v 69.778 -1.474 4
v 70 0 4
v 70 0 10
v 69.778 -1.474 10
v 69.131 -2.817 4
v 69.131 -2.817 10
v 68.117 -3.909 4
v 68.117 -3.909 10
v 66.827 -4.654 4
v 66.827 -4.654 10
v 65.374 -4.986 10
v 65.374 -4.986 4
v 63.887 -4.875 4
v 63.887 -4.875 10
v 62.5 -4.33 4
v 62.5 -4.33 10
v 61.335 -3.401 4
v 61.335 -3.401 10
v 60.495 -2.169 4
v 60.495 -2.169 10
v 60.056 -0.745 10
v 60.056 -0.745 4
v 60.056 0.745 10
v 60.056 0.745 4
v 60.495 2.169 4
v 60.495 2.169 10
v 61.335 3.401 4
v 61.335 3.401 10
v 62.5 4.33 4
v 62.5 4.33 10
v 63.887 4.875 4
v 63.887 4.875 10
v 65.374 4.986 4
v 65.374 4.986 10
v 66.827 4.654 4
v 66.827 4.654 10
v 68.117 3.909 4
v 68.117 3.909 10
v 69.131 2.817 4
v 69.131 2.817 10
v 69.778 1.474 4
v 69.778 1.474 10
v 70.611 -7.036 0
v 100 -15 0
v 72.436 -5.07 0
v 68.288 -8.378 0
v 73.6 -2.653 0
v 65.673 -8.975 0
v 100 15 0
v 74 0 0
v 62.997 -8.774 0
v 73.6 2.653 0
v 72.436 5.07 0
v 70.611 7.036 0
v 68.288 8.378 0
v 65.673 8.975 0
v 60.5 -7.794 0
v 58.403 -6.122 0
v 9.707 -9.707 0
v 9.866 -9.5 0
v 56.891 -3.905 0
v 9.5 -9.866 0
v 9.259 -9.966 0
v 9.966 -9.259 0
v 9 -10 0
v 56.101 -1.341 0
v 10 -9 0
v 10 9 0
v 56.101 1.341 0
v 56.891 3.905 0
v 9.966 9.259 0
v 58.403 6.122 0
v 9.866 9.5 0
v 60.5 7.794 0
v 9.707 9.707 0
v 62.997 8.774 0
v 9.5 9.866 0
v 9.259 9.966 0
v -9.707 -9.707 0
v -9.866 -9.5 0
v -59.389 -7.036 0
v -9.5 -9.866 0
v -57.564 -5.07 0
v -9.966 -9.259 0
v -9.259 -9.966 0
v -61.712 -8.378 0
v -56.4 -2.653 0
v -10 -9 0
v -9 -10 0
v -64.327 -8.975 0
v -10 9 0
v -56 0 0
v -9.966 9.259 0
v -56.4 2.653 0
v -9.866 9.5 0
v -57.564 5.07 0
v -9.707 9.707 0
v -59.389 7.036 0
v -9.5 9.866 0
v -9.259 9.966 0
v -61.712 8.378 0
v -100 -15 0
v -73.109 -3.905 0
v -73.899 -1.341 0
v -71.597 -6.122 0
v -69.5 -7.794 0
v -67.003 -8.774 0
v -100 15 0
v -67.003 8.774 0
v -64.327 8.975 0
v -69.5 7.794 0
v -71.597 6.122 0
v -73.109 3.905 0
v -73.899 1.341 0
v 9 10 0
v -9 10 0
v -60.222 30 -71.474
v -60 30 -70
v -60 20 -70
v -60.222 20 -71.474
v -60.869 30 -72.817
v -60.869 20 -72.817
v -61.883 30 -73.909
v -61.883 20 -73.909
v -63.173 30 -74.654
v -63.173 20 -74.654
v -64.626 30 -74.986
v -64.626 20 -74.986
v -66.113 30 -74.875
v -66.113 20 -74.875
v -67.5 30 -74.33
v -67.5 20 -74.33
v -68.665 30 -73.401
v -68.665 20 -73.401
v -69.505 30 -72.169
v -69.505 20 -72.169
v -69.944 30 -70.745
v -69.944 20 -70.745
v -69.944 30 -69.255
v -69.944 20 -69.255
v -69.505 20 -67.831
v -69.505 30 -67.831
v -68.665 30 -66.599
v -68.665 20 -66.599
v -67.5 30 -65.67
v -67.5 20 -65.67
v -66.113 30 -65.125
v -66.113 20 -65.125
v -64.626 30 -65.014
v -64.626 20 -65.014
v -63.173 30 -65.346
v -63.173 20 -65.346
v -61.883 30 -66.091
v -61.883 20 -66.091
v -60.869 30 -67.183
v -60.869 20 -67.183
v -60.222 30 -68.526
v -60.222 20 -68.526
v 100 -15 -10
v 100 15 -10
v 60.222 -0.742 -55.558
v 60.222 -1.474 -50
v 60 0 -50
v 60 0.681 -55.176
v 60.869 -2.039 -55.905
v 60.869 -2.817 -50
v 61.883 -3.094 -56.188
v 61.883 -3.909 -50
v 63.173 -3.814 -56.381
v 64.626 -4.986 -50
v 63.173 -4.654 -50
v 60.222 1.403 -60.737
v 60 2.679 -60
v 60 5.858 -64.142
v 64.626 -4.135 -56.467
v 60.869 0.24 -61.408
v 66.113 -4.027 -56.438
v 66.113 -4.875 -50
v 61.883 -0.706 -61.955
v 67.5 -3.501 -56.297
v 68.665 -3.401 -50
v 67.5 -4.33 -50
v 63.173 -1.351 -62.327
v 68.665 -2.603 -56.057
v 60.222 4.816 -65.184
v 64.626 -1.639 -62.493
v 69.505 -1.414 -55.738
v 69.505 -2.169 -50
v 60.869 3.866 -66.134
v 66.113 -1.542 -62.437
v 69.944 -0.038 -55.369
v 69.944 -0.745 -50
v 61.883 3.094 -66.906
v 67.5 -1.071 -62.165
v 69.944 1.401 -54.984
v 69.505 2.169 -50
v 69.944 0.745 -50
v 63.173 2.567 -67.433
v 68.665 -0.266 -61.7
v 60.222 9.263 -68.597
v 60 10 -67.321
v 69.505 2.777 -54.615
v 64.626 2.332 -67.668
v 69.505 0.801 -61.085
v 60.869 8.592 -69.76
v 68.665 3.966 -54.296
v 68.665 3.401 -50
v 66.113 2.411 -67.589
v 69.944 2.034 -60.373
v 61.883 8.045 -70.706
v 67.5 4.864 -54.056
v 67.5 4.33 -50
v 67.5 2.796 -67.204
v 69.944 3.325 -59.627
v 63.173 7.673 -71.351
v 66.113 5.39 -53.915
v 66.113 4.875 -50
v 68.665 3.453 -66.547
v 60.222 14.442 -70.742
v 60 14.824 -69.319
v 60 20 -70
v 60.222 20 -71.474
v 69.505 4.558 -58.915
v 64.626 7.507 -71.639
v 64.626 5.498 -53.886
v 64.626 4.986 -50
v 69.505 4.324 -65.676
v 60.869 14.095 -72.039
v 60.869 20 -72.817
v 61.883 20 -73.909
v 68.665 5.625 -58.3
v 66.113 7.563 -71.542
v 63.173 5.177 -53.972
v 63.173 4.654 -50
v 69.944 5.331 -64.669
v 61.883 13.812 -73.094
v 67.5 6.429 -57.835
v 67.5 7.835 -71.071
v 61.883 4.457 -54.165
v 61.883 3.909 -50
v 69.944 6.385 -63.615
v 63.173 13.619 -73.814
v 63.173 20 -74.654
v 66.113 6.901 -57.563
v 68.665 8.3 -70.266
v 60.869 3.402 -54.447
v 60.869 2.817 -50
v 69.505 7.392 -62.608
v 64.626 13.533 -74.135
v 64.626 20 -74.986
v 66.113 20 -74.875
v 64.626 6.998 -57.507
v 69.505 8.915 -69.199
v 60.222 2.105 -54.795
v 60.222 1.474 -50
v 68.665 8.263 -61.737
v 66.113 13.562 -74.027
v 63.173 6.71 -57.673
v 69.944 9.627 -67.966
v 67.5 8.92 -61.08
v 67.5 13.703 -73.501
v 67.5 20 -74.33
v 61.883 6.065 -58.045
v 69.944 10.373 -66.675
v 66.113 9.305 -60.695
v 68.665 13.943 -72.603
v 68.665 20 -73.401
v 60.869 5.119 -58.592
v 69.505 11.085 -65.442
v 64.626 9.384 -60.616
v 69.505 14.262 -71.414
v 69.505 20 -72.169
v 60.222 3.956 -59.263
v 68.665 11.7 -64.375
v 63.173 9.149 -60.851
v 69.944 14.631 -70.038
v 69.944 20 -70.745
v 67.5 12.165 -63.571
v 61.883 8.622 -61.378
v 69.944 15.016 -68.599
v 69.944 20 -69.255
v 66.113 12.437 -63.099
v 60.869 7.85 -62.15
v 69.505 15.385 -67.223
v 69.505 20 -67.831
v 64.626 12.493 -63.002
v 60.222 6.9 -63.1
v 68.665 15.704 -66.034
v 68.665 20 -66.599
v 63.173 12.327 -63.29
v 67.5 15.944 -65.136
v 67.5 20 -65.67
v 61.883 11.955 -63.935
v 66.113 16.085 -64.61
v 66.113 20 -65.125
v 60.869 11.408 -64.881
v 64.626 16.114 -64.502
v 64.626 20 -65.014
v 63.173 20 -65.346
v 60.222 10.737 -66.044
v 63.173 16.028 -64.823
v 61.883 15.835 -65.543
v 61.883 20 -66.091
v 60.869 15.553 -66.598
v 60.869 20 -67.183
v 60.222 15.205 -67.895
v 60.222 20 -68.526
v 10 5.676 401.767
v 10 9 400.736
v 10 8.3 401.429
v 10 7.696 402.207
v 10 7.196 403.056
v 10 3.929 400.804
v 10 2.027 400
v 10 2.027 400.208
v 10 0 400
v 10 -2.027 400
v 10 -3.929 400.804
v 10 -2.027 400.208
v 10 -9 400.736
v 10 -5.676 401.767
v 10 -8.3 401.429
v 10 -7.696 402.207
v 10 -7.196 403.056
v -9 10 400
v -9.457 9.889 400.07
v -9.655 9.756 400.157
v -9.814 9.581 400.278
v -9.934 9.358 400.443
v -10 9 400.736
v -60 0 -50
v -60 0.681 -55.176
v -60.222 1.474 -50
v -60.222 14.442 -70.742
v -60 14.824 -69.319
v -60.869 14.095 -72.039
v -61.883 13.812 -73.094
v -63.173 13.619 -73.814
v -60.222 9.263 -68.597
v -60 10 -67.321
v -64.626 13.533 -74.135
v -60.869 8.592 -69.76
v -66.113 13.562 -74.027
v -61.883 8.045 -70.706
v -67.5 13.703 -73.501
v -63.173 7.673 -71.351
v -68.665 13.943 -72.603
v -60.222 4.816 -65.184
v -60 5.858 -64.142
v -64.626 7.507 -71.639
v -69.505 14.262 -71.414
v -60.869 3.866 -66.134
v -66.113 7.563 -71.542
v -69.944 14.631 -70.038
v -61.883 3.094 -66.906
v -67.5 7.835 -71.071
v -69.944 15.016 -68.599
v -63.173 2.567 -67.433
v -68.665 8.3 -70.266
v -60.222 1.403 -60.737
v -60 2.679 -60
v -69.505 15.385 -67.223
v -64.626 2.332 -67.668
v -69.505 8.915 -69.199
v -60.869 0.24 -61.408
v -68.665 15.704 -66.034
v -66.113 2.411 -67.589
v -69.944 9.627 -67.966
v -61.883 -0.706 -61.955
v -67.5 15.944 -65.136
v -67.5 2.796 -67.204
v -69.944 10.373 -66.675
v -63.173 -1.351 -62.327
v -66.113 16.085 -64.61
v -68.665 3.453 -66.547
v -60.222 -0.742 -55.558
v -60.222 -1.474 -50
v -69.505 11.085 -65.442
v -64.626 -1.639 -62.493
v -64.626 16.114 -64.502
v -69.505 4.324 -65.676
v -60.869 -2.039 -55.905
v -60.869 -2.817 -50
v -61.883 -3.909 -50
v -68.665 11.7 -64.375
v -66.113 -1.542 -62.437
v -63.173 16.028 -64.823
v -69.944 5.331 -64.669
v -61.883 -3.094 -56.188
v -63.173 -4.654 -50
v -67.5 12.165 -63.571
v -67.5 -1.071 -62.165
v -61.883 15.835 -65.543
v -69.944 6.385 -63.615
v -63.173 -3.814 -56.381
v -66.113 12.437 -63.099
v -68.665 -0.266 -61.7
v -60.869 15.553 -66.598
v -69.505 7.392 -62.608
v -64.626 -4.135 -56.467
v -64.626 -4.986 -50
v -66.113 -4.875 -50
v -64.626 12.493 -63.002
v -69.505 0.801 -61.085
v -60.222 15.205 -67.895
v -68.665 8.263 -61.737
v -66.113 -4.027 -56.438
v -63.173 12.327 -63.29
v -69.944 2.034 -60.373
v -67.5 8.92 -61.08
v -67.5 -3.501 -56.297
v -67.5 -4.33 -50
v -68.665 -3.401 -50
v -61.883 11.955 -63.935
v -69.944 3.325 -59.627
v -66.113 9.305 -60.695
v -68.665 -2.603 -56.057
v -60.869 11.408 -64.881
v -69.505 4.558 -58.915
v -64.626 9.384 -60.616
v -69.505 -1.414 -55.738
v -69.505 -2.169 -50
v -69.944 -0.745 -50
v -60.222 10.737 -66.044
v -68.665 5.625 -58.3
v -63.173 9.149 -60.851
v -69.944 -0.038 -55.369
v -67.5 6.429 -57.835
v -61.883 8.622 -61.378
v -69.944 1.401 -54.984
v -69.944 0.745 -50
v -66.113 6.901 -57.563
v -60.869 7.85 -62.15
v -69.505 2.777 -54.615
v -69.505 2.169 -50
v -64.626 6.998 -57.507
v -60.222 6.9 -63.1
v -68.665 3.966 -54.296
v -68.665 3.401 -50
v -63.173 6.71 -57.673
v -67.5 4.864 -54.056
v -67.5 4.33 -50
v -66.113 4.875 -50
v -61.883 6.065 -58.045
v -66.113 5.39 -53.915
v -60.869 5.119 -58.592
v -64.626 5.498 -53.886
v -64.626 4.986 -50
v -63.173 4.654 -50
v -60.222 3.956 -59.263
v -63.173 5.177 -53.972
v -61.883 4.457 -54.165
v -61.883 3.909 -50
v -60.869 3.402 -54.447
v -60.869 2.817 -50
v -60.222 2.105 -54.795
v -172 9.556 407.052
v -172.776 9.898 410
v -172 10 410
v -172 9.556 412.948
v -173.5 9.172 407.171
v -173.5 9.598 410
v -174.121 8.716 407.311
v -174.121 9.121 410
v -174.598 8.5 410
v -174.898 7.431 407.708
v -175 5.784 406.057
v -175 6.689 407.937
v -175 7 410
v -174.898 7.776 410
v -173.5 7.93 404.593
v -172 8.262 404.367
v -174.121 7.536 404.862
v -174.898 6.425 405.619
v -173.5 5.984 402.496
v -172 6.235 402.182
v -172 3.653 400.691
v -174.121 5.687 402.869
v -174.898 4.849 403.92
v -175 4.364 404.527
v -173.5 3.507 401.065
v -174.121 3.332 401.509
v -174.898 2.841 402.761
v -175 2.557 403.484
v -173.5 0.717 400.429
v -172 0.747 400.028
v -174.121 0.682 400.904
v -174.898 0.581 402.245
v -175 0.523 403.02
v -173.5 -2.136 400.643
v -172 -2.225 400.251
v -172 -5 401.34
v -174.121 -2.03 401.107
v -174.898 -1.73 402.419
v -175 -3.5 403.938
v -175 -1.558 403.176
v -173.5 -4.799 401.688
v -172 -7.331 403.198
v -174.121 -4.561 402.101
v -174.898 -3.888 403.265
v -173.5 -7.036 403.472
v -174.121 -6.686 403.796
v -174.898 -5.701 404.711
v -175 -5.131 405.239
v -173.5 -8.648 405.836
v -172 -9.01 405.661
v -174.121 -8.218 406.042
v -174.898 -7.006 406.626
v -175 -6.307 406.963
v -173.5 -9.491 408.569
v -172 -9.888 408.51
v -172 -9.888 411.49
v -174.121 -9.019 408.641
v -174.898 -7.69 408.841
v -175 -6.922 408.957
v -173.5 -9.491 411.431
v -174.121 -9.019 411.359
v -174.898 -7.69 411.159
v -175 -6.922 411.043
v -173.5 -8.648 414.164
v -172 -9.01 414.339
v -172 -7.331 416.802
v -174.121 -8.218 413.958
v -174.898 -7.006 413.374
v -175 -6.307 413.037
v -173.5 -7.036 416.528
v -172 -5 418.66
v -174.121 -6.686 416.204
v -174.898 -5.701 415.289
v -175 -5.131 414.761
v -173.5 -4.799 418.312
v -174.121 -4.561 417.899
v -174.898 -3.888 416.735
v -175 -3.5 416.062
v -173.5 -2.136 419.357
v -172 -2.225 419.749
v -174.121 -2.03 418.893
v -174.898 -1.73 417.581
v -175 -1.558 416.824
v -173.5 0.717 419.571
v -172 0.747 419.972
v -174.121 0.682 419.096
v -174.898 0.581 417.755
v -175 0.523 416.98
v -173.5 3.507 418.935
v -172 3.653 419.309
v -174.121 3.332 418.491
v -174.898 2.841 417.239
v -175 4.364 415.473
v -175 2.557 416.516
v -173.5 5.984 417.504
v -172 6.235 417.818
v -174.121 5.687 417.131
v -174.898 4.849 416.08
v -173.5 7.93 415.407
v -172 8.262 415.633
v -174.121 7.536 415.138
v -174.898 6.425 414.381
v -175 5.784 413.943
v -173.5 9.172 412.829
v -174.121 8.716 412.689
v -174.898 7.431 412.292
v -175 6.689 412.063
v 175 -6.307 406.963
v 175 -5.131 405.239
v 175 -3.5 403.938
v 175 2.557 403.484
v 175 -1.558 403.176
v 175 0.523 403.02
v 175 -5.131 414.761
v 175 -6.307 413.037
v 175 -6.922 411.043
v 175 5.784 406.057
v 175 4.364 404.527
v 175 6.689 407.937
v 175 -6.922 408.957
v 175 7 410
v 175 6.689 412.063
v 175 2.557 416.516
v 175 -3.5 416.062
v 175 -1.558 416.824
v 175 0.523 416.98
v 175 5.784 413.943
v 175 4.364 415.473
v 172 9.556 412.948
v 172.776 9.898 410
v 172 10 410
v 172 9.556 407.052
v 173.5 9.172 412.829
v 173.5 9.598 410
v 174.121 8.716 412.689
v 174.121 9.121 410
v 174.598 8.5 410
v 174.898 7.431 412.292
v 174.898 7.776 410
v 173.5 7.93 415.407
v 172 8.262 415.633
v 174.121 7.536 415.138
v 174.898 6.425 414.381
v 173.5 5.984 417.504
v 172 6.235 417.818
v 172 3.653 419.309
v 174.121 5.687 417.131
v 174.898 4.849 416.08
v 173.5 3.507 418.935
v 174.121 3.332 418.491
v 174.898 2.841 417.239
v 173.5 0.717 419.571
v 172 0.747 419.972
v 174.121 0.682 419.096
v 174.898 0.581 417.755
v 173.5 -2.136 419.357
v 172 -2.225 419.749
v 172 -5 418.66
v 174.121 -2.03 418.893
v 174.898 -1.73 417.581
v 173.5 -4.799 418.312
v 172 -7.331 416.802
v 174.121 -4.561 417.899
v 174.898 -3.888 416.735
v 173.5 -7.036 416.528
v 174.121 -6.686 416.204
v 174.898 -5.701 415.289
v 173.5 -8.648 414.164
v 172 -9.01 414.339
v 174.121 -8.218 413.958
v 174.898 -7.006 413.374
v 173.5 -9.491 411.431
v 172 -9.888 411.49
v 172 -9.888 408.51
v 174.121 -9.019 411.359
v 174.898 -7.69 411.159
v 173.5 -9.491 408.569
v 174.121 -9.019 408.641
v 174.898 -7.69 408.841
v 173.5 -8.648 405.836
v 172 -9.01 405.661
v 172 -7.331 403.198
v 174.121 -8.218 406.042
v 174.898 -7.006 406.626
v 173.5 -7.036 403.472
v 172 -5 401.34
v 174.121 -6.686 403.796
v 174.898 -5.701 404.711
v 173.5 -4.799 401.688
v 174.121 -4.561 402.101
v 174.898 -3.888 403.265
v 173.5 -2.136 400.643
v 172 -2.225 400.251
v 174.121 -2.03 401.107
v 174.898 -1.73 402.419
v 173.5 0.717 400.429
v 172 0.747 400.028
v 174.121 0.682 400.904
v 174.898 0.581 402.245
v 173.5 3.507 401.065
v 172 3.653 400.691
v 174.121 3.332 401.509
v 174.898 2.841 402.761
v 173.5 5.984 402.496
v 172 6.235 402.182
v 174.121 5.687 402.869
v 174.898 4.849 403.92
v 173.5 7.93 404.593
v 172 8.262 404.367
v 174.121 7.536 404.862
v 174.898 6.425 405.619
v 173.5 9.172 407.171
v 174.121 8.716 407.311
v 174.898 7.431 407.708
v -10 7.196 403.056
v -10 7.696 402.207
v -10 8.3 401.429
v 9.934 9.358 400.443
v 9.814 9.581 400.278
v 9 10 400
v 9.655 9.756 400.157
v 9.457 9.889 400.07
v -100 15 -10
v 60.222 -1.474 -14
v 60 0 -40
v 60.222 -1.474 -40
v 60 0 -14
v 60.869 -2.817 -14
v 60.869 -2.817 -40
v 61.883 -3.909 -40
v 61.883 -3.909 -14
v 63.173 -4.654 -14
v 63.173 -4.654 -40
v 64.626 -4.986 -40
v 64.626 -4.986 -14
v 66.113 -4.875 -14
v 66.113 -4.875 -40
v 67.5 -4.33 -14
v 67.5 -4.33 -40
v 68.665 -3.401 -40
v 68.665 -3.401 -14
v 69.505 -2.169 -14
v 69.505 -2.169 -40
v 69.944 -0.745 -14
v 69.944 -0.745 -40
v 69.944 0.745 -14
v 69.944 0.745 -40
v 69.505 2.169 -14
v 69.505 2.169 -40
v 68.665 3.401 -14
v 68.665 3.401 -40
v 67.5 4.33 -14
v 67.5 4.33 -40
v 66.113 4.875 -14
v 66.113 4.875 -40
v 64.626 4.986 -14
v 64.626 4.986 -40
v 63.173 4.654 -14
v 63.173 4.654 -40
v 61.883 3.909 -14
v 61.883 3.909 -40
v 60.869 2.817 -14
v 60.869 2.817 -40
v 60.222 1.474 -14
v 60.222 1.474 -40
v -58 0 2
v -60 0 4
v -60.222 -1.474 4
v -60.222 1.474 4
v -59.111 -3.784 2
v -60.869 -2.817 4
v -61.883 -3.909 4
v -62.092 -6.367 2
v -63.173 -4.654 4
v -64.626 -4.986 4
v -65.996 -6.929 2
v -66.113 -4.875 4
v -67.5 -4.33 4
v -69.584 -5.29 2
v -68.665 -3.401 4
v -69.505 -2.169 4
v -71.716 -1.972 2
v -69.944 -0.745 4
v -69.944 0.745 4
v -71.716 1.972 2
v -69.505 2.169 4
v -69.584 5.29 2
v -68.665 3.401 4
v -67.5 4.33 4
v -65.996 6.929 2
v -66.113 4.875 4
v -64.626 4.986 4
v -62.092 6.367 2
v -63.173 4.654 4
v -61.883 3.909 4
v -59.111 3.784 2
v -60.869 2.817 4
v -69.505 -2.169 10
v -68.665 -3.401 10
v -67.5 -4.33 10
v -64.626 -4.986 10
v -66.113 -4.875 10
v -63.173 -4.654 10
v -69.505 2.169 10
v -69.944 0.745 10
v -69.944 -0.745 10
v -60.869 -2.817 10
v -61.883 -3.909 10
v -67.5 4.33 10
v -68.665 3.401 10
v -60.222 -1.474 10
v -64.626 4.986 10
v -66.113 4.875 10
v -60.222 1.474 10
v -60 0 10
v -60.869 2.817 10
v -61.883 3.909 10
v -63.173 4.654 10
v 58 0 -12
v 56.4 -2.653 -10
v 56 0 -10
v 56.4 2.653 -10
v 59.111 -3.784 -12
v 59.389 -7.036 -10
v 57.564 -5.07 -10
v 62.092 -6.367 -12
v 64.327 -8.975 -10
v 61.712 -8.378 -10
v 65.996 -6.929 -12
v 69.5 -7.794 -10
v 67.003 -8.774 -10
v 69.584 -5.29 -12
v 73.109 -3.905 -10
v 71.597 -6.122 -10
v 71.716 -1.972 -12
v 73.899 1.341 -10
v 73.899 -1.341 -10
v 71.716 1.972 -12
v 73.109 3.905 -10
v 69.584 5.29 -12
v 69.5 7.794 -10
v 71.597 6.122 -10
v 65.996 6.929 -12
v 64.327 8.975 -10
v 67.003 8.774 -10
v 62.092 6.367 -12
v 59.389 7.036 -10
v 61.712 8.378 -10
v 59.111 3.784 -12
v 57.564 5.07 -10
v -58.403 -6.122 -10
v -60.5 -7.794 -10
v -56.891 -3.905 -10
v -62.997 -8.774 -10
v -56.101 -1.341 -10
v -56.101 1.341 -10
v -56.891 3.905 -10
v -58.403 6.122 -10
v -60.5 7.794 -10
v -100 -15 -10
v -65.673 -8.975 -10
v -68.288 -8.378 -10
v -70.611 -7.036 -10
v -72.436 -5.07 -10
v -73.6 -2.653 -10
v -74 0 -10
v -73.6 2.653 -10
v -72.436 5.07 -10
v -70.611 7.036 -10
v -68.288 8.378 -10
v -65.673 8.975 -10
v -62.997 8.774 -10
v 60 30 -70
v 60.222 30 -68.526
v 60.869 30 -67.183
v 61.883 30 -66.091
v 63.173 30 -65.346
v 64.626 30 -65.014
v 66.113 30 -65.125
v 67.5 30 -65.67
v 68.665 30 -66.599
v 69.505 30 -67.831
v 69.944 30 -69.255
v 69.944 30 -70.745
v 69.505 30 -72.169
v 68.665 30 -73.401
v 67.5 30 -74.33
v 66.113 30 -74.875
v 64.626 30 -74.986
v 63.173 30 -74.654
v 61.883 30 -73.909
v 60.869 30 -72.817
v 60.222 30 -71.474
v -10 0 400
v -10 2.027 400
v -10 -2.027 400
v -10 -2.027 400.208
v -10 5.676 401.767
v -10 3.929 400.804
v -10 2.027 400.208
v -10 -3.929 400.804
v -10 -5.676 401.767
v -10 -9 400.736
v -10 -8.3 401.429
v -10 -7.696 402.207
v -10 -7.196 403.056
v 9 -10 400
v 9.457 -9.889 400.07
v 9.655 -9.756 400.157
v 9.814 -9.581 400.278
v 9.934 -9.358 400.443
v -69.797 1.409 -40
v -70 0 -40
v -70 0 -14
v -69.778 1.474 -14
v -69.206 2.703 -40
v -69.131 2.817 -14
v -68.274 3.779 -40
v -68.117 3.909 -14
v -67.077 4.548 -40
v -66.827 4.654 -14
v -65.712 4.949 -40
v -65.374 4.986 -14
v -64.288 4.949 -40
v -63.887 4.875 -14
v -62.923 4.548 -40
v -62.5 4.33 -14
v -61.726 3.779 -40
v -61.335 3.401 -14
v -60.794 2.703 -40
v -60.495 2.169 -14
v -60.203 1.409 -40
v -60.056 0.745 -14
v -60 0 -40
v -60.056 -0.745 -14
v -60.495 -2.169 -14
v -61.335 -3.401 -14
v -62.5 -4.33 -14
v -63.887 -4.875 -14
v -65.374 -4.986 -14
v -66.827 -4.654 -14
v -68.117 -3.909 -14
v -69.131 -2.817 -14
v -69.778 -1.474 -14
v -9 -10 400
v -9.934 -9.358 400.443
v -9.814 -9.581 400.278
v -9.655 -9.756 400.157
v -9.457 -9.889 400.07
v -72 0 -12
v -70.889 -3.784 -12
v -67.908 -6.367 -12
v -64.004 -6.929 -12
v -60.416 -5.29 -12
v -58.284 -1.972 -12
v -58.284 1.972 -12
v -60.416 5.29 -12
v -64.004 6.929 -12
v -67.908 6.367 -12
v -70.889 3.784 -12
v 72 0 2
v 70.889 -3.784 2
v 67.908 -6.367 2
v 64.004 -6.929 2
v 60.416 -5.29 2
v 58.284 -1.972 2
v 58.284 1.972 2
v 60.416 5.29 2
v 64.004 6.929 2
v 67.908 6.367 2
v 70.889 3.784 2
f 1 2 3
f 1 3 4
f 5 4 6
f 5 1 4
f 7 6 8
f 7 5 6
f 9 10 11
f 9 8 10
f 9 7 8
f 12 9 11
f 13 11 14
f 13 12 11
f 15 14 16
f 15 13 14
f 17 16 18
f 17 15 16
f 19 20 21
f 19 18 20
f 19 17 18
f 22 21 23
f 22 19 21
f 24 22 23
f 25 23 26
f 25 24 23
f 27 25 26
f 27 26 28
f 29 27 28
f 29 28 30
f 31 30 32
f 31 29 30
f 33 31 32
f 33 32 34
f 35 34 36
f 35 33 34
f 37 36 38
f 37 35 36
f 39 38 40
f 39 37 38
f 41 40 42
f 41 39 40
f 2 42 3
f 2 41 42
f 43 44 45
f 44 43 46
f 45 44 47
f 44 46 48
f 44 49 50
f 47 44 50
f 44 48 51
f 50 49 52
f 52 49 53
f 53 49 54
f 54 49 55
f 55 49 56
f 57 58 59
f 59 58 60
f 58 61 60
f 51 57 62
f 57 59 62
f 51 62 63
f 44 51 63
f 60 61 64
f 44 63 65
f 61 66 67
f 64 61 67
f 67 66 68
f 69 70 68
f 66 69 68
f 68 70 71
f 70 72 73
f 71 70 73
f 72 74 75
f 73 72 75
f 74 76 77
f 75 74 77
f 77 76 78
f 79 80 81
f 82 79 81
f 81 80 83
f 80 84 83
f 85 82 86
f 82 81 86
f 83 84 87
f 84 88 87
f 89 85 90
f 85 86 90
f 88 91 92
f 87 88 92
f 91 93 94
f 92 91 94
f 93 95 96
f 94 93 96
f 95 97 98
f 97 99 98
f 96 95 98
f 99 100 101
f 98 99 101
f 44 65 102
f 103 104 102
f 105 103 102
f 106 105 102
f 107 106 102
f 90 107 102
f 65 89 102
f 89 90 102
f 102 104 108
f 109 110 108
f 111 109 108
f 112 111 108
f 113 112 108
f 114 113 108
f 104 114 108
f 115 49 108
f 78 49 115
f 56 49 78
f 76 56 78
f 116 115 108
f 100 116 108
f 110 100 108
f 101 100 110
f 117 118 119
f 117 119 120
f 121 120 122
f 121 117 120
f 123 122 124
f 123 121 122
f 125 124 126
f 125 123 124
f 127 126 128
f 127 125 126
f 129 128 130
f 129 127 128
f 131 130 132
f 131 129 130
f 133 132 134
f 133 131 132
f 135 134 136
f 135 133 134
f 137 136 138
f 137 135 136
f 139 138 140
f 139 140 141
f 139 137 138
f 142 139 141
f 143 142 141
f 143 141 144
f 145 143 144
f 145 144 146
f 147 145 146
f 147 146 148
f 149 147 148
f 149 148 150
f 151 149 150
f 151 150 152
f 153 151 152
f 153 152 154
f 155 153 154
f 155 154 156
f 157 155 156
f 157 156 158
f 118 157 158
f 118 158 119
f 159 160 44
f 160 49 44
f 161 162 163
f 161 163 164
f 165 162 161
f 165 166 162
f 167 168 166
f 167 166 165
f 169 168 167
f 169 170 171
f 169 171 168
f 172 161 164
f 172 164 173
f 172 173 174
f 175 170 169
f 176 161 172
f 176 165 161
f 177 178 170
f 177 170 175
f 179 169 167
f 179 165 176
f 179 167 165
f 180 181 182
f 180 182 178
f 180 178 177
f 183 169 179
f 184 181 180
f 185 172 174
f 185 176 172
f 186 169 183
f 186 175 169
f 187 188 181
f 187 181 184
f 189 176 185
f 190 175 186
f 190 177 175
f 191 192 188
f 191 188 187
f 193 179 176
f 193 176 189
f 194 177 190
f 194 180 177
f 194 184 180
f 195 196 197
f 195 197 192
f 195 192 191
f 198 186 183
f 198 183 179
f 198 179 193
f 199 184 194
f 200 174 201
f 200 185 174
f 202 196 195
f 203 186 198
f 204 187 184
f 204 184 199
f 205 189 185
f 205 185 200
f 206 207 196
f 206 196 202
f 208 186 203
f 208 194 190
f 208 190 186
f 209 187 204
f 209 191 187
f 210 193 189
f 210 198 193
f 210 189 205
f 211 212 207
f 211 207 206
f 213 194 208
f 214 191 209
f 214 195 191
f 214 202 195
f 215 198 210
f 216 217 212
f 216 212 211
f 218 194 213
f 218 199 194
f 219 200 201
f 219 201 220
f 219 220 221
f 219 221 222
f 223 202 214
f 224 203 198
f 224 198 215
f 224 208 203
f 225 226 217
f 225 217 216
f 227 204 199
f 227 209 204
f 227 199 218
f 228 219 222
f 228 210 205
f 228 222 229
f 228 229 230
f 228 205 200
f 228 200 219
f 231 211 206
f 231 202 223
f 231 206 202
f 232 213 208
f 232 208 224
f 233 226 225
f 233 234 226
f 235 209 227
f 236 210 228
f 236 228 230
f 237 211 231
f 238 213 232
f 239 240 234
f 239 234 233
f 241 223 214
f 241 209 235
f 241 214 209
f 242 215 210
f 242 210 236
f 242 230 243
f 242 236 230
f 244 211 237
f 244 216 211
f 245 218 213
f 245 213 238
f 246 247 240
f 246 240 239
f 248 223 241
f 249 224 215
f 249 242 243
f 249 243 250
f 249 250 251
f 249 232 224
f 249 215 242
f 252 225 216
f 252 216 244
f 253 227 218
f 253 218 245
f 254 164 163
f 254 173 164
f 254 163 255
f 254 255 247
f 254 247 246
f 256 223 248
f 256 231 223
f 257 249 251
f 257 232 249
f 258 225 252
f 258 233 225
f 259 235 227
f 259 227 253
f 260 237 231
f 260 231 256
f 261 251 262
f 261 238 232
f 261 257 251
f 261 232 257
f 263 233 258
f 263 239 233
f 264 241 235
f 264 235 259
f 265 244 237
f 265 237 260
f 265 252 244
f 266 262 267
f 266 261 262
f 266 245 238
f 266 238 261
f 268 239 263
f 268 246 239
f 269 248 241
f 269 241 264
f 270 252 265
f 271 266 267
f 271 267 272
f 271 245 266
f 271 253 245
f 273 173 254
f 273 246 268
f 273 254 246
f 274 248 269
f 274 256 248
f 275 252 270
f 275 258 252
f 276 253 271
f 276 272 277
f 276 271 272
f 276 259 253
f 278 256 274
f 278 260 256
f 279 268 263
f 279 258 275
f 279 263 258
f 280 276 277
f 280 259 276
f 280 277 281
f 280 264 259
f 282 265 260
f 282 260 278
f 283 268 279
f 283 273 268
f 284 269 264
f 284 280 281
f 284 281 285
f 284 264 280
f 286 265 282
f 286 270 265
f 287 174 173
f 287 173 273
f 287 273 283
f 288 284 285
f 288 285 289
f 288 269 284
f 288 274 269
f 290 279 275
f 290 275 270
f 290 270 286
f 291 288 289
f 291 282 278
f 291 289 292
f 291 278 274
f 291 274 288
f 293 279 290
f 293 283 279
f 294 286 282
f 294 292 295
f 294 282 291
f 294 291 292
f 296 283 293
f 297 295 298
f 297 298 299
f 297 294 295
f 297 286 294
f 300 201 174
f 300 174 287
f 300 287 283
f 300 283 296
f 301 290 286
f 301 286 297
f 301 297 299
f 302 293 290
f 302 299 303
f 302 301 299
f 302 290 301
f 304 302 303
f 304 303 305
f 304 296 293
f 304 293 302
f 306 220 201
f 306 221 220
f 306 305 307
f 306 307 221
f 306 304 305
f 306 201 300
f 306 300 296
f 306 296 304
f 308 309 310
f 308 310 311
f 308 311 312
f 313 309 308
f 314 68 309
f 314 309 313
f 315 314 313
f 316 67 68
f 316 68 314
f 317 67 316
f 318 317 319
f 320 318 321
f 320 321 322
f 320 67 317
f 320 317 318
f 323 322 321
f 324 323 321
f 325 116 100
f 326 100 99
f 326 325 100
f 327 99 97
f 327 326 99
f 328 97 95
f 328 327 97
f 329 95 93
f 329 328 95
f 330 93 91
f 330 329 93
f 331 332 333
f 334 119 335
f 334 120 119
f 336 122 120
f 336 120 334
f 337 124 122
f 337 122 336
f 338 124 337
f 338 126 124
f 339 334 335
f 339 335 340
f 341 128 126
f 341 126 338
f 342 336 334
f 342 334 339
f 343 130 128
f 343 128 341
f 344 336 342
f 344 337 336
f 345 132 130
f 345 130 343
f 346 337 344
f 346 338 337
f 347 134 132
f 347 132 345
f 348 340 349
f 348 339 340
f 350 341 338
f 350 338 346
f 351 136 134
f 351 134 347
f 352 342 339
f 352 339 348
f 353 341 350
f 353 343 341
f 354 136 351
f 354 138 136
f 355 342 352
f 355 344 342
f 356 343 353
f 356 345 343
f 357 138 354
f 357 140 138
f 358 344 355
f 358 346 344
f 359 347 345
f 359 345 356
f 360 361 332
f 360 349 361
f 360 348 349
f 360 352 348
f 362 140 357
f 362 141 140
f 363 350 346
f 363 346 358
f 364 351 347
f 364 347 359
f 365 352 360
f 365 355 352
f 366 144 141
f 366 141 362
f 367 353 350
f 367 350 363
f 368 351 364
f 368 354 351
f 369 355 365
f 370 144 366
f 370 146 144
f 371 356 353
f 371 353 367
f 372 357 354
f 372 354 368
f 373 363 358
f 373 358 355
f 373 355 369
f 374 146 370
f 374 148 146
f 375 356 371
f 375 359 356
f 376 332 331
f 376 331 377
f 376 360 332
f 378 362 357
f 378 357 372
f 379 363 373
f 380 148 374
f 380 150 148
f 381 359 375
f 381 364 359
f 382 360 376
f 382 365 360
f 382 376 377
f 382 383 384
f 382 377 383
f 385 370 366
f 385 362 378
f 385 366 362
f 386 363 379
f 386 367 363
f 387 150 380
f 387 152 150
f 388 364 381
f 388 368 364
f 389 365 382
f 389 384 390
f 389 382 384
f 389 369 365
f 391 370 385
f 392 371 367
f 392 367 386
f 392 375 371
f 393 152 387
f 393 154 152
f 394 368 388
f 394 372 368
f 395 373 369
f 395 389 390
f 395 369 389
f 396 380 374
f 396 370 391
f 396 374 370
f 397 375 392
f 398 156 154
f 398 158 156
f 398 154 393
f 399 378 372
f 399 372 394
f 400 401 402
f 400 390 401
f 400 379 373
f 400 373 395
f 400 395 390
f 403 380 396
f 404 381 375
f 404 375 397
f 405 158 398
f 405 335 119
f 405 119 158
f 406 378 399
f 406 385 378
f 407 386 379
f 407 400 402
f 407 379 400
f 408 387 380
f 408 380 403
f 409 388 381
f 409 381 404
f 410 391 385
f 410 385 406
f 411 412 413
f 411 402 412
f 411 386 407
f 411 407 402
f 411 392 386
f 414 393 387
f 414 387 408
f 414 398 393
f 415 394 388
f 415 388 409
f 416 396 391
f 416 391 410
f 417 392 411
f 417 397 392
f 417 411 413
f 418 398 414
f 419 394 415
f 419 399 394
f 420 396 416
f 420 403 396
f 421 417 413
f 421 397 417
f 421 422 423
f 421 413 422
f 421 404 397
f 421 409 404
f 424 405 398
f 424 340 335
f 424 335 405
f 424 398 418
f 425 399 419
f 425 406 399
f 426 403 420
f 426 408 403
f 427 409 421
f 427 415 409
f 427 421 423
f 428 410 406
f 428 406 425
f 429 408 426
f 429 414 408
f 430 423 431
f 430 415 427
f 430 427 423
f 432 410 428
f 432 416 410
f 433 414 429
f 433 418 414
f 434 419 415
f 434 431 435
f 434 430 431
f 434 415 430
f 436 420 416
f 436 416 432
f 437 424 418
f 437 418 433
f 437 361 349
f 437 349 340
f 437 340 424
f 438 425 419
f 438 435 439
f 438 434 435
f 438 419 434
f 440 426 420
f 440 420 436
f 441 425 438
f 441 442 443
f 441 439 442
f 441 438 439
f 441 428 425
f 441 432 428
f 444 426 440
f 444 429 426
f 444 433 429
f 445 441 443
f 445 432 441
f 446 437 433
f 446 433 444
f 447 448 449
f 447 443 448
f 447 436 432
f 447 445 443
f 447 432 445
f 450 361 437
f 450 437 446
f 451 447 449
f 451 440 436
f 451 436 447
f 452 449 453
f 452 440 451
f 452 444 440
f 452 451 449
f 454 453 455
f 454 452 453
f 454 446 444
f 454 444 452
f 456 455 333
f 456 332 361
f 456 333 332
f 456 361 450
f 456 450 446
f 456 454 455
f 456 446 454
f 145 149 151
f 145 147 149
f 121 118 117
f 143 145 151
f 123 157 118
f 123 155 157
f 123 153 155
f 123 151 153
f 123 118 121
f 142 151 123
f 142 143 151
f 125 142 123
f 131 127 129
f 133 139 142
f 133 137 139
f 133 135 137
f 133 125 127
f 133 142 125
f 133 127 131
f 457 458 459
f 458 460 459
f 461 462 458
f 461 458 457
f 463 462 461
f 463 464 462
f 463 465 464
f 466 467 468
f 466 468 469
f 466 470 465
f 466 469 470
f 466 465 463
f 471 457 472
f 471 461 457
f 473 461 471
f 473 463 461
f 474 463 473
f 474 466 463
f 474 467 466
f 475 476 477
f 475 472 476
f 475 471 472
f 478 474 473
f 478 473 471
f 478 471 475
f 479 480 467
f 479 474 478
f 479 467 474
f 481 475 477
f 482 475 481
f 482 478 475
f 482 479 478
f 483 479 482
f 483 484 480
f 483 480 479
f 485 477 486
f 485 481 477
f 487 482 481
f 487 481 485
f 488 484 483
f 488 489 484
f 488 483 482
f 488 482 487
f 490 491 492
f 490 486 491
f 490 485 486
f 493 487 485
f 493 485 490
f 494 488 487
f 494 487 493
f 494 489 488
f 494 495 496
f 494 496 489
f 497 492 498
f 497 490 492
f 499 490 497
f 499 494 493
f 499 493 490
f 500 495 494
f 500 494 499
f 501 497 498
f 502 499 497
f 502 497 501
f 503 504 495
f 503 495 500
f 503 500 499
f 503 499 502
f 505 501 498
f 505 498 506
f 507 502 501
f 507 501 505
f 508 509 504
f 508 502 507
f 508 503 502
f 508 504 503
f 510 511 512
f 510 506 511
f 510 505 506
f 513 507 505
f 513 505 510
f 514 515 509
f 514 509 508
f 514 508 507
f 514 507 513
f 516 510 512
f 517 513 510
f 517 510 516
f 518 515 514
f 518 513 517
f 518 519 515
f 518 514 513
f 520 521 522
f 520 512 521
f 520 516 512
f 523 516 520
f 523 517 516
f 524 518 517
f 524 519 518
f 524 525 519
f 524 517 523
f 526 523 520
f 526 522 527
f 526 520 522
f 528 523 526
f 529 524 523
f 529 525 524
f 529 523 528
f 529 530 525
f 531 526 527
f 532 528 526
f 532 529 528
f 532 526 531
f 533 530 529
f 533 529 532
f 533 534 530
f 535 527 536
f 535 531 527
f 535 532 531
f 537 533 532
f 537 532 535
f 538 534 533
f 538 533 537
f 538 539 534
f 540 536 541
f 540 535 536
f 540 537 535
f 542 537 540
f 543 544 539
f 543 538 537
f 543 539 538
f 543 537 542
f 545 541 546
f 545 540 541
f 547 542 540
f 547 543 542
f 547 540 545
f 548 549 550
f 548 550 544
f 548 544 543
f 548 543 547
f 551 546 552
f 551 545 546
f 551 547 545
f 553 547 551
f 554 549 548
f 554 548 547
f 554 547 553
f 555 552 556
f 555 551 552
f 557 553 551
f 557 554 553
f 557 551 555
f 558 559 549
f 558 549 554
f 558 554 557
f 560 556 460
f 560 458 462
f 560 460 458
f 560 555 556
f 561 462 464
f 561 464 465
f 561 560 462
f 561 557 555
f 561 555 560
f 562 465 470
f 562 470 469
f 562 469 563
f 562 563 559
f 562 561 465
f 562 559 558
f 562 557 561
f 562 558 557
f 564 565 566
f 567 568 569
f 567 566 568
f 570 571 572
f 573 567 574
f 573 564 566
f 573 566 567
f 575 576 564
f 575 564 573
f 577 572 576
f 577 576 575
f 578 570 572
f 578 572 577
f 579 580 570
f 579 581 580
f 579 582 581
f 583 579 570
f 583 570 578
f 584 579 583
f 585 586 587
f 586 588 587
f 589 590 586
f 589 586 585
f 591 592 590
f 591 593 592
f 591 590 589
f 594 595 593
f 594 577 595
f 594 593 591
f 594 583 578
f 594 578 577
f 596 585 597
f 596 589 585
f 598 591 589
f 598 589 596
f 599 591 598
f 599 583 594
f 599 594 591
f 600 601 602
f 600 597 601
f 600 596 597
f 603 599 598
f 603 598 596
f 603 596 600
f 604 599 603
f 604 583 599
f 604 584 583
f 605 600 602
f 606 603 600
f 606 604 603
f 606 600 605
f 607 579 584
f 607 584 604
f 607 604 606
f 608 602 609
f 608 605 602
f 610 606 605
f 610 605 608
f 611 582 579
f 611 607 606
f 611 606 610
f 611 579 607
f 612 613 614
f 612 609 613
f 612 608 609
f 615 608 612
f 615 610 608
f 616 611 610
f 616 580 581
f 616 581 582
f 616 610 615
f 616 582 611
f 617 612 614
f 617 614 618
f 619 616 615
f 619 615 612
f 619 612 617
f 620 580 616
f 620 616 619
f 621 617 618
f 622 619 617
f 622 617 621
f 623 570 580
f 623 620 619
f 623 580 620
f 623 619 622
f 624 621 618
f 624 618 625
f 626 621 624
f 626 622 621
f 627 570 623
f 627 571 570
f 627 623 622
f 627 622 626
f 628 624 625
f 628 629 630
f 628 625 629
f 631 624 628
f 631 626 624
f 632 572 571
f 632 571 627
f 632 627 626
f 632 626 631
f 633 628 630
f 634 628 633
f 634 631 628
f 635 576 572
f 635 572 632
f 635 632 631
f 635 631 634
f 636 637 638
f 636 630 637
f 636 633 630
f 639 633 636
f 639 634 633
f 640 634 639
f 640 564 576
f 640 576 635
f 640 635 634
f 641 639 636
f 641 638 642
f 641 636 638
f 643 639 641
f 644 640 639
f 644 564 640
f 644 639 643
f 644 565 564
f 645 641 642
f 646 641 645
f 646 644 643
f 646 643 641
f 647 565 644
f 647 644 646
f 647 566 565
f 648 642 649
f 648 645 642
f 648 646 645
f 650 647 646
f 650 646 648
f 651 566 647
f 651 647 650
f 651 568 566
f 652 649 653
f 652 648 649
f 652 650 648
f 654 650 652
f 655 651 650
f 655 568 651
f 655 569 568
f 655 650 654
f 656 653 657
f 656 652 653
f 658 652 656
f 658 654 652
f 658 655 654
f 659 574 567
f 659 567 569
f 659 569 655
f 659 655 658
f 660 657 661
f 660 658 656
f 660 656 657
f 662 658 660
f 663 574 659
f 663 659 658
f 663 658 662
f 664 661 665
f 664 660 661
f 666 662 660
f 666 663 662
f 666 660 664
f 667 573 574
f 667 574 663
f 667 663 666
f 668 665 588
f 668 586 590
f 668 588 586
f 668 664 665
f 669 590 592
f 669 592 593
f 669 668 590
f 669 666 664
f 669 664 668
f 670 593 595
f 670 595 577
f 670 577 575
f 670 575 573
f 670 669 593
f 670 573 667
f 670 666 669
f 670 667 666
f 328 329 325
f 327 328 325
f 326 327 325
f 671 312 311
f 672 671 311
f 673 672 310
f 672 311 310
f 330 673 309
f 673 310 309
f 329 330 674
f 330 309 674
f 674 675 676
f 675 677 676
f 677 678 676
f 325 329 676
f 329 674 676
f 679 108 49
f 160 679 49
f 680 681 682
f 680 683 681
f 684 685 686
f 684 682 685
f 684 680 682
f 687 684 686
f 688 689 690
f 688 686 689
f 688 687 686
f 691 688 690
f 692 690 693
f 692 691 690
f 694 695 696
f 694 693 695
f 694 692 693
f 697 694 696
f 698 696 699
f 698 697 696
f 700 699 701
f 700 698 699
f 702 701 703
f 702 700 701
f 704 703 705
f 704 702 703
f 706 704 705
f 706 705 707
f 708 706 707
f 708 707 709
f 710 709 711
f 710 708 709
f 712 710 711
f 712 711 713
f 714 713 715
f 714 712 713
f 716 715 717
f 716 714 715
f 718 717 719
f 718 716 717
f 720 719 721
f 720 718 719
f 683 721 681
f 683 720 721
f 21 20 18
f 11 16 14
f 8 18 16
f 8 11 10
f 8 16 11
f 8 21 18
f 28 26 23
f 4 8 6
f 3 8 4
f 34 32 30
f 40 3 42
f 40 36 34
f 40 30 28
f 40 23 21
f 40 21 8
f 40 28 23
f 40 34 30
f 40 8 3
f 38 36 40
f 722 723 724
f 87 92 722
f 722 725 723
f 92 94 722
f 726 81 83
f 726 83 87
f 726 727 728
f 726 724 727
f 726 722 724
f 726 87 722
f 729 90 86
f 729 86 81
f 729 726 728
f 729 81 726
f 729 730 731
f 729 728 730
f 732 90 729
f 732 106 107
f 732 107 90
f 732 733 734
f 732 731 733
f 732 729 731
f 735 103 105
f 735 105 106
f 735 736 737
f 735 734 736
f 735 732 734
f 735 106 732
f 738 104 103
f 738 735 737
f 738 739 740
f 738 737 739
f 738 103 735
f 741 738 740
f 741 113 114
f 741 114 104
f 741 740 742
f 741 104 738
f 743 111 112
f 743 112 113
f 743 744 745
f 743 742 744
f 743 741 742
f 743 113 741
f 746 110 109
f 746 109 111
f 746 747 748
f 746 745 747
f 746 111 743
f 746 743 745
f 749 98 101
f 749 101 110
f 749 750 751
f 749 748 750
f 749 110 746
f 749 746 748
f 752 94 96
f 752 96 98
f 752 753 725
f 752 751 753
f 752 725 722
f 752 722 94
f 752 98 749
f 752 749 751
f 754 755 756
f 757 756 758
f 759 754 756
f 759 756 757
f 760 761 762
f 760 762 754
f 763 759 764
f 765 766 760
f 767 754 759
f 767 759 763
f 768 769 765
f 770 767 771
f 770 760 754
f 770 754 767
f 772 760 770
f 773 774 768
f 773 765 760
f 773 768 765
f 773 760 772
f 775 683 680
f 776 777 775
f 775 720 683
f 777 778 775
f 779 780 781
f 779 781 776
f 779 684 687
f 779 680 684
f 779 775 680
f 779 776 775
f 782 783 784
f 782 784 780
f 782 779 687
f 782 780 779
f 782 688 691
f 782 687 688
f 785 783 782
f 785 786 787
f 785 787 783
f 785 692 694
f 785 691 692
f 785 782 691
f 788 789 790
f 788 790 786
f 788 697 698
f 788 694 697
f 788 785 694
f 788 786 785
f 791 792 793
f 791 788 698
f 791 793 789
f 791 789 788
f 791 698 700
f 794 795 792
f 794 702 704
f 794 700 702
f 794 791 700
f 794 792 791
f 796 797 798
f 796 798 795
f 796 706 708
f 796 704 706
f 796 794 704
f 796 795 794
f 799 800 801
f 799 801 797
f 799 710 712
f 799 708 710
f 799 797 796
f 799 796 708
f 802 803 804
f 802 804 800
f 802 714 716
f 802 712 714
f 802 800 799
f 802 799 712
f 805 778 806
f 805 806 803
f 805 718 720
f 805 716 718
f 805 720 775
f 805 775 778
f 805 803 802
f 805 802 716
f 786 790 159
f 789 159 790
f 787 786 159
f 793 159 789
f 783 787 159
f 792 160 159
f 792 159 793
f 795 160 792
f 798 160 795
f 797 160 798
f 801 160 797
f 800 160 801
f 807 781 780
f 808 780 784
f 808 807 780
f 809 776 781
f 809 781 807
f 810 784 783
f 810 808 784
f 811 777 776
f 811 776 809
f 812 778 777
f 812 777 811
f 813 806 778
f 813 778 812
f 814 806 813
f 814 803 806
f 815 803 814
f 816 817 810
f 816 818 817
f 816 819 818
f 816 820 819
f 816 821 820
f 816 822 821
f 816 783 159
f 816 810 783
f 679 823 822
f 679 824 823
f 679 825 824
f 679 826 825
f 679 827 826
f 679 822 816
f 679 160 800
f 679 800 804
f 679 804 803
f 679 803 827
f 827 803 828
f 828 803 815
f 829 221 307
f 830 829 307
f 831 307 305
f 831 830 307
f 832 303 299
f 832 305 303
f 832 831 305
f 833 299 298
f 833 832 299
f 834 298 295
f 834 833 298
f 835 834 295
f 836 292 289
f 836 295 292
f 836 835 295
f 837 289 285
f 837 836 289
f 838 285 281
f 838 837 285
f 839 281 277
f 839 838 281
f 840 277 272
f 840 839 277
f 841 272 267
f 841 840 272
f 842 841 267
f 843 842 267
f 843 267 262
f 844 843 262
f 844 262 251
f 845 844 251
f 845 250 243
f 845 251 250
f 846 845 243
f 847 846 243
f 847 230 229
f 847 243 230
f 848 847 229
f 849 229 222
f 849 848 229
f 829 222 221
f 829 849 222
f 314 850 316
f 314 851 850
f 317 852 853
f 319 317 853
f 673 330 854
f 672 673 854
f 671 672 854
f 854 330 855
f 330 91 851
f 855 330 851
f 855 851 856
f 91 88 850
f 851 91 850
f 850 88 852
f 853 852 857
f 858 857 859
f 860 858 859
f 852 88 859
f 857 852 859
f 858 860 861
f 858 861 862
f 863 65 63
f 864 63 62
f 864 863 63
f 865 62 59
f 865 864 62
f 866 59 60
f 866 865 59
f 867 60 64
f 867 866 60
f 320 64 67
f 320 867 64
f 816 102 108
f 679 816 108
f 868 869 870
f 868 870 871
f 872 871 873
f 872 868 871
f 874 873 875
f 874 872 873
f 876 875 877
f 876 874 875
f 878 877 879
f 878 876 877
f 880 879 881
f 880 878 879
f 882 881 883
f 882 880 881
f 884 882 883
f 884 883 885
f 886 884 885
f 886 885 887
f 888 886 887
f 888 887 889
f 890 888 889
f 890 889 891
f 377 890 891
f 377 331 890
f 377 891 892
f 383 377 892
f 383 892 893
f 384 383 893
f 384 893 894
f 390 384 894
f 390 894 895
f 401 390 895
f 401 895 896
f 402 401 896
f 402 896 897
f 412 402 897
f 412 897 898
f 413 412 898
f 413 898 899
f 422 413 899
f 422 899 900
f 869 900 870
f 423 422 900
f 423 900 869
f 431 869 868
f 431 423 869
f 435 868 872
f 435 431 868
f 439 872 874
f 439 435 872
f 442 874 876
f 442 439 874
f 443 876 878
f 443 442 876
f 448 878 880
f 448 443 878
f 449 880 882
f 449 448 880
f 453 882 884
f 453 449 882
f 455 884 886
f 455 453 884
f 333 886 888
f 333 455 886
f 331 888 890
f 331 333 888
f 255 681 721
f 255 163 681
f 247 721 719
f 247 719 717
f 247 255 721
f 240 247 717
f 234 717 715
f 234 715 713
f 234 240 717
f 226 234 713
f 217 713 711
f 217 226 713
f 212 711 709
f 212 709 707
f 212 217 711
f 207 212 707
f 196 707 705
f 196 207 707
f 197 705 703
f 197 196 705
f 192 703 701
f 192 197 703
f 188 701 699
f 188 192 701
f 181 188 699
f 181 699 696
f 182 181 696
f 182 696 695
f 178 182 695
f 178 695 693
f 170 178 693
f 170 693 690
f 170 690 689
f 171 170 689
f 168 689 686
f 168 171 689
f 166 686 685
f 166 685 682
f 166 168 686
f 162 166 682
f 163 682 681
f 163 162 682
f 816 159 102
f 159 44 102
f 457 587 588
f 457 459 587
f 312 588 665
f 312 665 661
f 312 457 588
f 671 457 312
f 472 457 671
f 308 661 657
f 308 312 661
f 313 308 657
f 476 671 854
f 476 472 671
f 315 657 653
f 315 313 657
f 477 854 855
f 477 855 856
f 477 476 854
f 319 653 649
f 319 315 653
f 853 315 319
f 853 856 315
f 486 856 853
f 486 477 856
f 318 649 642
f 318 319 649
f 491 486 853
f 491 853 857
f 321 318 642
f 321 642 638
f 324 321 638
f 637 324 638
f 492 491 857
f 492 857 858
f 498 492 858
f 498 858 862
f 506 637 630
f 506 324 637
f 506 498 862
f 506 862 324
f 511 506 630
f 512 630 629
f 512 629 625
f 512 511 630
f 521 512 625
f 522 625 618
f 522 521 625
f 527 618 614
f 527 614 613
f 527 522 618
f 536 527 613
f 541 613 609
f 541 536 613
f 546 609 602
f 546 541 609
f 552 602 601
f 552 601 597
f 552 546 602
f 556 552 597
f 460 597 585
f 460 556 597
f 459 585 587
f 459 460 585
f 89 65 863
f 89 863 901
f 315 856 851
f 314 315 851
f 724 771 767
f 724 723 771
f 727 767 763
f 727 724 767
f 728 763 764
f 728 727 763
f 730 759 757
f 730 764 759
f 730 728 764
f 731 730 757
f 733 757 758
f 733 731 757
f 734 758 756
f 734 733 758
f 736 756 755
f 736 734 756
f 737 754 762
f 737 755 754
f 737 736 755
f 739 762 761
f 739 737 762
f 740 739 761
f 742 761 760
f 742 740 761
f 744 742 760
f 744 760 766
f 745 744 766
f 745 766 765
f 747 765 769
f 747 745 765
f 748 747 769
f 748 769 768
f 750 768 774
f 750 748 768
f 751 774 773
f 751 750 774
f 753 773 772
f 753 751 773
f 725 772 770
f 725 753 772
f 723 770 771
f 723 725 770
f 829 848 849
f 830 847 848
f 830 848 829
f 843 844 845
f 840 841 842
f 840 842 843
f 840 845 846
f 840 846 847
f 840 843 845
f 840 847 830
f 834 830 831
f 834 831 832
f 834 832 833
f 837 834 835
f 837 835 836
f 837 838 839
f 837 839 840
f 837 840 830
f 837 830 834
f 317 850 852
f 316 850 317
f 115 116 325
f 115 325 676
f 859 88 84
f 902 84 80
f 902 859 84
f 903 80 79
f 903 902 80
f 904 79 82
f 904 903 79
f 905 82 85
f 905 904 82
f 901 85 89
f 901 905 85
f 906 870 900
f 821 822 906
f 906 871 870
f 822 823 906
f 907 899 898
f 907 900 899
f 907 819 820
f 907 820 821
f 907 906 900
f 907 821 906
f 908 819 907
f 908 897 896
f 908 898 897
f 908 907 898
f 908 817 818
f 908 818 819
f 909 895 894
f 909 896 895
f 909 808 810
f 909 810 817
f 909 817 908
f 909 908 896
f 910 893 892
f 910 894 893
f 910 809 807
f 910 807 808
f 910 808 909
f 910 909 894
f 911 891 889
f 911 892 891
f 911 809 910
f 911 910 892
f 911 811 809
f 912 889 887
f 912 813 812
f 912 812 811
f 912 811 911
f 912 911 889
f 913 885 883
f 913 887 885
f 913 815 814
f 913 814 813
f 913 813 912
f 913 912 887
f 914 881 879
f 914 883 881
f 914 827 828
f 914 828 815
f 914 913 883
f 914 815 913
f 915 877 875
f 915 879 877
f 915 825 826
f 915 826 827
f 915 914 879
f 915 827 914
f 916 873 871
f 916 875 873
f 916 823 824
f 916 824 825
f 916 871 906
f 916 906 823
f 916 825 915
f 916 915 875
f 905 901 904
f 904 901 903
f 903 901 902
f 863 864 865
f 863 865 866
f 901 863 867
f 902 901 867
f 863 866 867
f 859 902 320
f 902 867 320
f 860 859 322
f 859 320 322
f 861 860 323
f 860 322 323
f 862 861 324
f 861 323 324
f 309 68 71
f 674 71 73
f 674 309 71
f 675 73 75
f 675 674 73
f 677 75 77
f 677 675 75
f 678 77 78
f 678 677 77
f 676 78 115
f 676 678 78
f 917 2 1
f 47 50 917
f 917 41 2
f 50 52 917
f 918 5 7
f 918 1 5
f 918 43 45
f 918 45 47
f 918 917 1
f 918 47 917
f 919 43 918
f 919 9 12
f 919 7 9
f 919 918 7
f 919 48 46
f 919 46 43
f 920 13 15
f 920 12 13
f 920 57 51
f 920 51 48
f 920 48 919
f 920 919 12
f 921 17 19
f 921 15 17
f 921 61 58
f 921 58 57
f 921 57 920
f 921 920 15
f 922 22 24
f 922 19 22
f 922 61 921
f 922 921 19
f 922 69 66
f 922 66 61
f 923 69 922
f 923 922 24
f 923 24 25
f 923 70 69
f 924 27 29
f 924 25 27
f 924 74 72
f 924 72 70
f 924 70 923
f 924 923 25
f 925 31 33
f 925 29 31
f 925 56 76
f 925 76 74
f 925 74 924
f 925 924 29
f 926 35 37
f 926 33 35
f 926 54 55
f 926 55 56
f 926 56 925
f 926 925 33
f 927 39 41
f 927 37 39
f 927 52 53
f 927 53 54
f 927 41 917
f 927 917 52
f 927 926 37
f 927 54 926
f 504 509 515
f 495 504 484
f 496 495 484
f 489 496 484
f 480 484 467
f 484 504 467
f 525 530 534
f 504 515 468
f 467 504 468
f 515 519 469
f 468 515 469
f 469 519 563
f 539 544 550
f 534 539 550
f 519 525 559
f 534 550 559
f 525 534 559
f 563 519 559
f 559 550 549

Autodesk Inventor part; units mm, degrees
ref_plane "XZ Plane" through (0, 0, 0) normal (0, 1, 0) x (-1, 0, 0)
sketch "Skizze1" plane through (0, 0, 0) normal (0, 0, 1) x (1, 0, 0)
  line L0 (10, -10) -> (-10, -10)
  line L1 (-10, -10) -> (-10, 10)
  line L2 (-10, 10) -> (10, 10)
  line L3 (10, 10) -> (10, -10)
  line L4 (10, -10) -> (-10, 10) construction
  line L5 (-10, -10) -> (10, 10) construction
  point P0 (0, 0)
  dimension "d0" = 20
  dimension "d1" = 20
extrude "Extrusion1" add sketch "Skizze1" along normal blind 400
ref_plane "Arbeitsebene1" through (0, 0, 0) normal (1, 0, 0) x (0, 1, 0)
sketch "Skizze2" plane through (0, 0, 0) normal (1, 0, 0) x (0, 1, 0)
  line L0 (10, 0) -> (-10, 0) projected
  line L1 (10, 0) -> (10, 400) projected
  line L2 (-10, 400) -> (10, 400) projected
  line L3 (-10, 0) -> (-10, 400) projected
  circle A0 centre (0, 410) radius 10
  line L4 (-10, 400) -> (10, 400) projected
  point P0 (0, 0)
  point P1 (0, 400)
  dimension "d5" = 20
extrude "Extrusion2" add sketch "Skizze2" along normal mid plane 350 contours A0
sketch "Skizze4" plane through (10, 10, 400) normal (1, 0, 0) x (0, 0, -1)
  circle A0 centre (-10, -10) radius 10 projected
  line L0 (400, 0) -> (400, -20) projected
  line L1 (400, 0) -> (0, 0) projected
  line L2 (0, -10) -> (0, 0) projected
  line L3 (0, -20) -> (0, -10) projected
  line L4 (400, -20) -> (0, -20) projected
  line L5 (0, -20) -> (0, -10) projected
  line L6 (0, -12.0268) -> (-0.2075, -12.0268)
  arc A1 (0, -20) -> (-3.0565, -17.1964) centre (-6.4849, -24.002) ccw
  circle A2 centre (-10, -10) radius 10 projected
  arc A3 (-3.0565, -17.1964) -> (-0.2075, -12.0268) centre (-10, -10) ccw
  line L7 (0, -20) -> (0, -12.0268)
  point P0 (400, -10)
extrude "Extrusion3" add sketch "Skizze4" against normal blind 20 contours A0 L6 L3 A1
mirror "Spiegeln1" about plane through (0, 0, 0) normal (0, 1, 0) of "Extrusion3"
fillet "Rundung1" radius 1 4 edges at (10, -10, 200) (-10, -10, 200) (-10, 10, 200) (10, 10, 200)
fillet "Rundung2" radius 3 2 edges at (175, -10, 410) (-175, -10, 410)
sketch "Skizze5" plane through (0, 0, 0) normal (0, 0, -1) x (-1, 0, 0)
  line L0 (-100, -15) -> (100, -15)
  line L1 (100, -15) -> (100, 15)
  line L2 (100, 15) -> (-100, 15)
  line L3 (-100, 15) -> (-100, -15)
  line L4 (-100, -15) -> (100, 15) construction
  line L5 (100, -15) -> (-100, 15) construction
  point P0 (0, 0)
  dimension "d12" = 30
  dimension "d13" = 200
extrude "Extrusion4" add sketch "Skizze5" along normal blind 10
sketch "Skizze6" plane through (0, 0, 0) normal (0, 0, 1) x (1, 0, 0)
  line L0 (100, -15) -> (-100, -15) projected
  line L1 (100, 15) -> (100, -15) projected
  line L2 (-100, 15) -> (100, 15) projected
  line L3 (-100, -15) -> (-100, 15) projected
  arc A0 (-10, -9) -> (-9, -10) centre (-9, -9) ccw projected
  line L4 (-10, -9) -> (-10, 9) projected
  arc A1 (-9, 10) -> (-10, 9) centre (-9, 9) ccw projected
  line L5 (-9, 10) -> (9, 10) projected
  arc A2 (10, 9) -> (9, 10) centre (9, 9) ccw projected
  line L6 (10, 9) -> (10, -9) projected
  arc A3 (9, -10) -> (10, -9) centre (9, -9) ccw projected
  line L7 (9, -10) -> (-9, -10) projected
  circle A4 centre (65, 0) radius 5
  circle A5 centre (-65, 0) radius 5
  line L8 (10, 9) -> (10, -9) projected
  point P0 (0, 0)
  point P1 (10, 0)
  point P2 (-10, 0)
  dimension "d16" = 130
  dimension "d17" = 65
  dimension "d18" = 10
  dimension "d19" = 10
extrude "Extrusion5" add sketch "Skizze6" along normal blind 10 contours A4 | A5
sketch "Skizze7" plane through (0, 0, -10) normal (0, 0, -1) x (-1, 0, 0)
  circle A0 centre (-65, 0) radius 5 projected
  circle A1 centre (65, 0) radius 5 projected
  point P0 (0, 0)
extrude "Extrusion6" add sketch "Skizze7" along normal blind 30
chamfer "Fase1" distance 4 angle 45 4 edges at (70, 0, -10) (60, 0, 0) (-70, 0, 0) (-60, 0, -10)
sketch "Skizze8" plane through (65, 0, -40) normal (0, 0, -1) x (-1, 0, 0)
  circle A0 centre (0, 0) radius 5 projected
  circle A1 centre (0, 0) radius 5 projected
  point P0 (65, 0)
ref_plane "Arbeitsebene2" through (65, 0, -40) normal (1, 0, 0) x (0, 0, -1)
sketch "Skizze9" plane through (65, 0, -40) normal (1, 0, 0) x (0, 0, -1)
  line L0 (-30, 15) -> (-30, -15) projected
  line L1 (0, -5) -> (0, 5) projected
  line L2 (0, 0) -> (10, 0)
  line L3 (30, 20) -> (30, 30)
  arc A0 (10, 0) -> (30, 20) centre (10, 20) ccw
  point P0 (-40, 0)
  point P1 (-30, 0)
  point P2 (30, 0)
  dimension "d29" = 30
  dimension "d30" = 30
  dimension "d31" = 20
sweep "Sweeping1" add profiles "Skizze8" path "Skizze9" path curves L2 A0 L3
mirror "Spiegeln2" about plane through (0, 0, 0) normal (1, 0, 0) of "Sweeping1"
properties part number "Schlüssel" material "Stahl, galvanisiert"
